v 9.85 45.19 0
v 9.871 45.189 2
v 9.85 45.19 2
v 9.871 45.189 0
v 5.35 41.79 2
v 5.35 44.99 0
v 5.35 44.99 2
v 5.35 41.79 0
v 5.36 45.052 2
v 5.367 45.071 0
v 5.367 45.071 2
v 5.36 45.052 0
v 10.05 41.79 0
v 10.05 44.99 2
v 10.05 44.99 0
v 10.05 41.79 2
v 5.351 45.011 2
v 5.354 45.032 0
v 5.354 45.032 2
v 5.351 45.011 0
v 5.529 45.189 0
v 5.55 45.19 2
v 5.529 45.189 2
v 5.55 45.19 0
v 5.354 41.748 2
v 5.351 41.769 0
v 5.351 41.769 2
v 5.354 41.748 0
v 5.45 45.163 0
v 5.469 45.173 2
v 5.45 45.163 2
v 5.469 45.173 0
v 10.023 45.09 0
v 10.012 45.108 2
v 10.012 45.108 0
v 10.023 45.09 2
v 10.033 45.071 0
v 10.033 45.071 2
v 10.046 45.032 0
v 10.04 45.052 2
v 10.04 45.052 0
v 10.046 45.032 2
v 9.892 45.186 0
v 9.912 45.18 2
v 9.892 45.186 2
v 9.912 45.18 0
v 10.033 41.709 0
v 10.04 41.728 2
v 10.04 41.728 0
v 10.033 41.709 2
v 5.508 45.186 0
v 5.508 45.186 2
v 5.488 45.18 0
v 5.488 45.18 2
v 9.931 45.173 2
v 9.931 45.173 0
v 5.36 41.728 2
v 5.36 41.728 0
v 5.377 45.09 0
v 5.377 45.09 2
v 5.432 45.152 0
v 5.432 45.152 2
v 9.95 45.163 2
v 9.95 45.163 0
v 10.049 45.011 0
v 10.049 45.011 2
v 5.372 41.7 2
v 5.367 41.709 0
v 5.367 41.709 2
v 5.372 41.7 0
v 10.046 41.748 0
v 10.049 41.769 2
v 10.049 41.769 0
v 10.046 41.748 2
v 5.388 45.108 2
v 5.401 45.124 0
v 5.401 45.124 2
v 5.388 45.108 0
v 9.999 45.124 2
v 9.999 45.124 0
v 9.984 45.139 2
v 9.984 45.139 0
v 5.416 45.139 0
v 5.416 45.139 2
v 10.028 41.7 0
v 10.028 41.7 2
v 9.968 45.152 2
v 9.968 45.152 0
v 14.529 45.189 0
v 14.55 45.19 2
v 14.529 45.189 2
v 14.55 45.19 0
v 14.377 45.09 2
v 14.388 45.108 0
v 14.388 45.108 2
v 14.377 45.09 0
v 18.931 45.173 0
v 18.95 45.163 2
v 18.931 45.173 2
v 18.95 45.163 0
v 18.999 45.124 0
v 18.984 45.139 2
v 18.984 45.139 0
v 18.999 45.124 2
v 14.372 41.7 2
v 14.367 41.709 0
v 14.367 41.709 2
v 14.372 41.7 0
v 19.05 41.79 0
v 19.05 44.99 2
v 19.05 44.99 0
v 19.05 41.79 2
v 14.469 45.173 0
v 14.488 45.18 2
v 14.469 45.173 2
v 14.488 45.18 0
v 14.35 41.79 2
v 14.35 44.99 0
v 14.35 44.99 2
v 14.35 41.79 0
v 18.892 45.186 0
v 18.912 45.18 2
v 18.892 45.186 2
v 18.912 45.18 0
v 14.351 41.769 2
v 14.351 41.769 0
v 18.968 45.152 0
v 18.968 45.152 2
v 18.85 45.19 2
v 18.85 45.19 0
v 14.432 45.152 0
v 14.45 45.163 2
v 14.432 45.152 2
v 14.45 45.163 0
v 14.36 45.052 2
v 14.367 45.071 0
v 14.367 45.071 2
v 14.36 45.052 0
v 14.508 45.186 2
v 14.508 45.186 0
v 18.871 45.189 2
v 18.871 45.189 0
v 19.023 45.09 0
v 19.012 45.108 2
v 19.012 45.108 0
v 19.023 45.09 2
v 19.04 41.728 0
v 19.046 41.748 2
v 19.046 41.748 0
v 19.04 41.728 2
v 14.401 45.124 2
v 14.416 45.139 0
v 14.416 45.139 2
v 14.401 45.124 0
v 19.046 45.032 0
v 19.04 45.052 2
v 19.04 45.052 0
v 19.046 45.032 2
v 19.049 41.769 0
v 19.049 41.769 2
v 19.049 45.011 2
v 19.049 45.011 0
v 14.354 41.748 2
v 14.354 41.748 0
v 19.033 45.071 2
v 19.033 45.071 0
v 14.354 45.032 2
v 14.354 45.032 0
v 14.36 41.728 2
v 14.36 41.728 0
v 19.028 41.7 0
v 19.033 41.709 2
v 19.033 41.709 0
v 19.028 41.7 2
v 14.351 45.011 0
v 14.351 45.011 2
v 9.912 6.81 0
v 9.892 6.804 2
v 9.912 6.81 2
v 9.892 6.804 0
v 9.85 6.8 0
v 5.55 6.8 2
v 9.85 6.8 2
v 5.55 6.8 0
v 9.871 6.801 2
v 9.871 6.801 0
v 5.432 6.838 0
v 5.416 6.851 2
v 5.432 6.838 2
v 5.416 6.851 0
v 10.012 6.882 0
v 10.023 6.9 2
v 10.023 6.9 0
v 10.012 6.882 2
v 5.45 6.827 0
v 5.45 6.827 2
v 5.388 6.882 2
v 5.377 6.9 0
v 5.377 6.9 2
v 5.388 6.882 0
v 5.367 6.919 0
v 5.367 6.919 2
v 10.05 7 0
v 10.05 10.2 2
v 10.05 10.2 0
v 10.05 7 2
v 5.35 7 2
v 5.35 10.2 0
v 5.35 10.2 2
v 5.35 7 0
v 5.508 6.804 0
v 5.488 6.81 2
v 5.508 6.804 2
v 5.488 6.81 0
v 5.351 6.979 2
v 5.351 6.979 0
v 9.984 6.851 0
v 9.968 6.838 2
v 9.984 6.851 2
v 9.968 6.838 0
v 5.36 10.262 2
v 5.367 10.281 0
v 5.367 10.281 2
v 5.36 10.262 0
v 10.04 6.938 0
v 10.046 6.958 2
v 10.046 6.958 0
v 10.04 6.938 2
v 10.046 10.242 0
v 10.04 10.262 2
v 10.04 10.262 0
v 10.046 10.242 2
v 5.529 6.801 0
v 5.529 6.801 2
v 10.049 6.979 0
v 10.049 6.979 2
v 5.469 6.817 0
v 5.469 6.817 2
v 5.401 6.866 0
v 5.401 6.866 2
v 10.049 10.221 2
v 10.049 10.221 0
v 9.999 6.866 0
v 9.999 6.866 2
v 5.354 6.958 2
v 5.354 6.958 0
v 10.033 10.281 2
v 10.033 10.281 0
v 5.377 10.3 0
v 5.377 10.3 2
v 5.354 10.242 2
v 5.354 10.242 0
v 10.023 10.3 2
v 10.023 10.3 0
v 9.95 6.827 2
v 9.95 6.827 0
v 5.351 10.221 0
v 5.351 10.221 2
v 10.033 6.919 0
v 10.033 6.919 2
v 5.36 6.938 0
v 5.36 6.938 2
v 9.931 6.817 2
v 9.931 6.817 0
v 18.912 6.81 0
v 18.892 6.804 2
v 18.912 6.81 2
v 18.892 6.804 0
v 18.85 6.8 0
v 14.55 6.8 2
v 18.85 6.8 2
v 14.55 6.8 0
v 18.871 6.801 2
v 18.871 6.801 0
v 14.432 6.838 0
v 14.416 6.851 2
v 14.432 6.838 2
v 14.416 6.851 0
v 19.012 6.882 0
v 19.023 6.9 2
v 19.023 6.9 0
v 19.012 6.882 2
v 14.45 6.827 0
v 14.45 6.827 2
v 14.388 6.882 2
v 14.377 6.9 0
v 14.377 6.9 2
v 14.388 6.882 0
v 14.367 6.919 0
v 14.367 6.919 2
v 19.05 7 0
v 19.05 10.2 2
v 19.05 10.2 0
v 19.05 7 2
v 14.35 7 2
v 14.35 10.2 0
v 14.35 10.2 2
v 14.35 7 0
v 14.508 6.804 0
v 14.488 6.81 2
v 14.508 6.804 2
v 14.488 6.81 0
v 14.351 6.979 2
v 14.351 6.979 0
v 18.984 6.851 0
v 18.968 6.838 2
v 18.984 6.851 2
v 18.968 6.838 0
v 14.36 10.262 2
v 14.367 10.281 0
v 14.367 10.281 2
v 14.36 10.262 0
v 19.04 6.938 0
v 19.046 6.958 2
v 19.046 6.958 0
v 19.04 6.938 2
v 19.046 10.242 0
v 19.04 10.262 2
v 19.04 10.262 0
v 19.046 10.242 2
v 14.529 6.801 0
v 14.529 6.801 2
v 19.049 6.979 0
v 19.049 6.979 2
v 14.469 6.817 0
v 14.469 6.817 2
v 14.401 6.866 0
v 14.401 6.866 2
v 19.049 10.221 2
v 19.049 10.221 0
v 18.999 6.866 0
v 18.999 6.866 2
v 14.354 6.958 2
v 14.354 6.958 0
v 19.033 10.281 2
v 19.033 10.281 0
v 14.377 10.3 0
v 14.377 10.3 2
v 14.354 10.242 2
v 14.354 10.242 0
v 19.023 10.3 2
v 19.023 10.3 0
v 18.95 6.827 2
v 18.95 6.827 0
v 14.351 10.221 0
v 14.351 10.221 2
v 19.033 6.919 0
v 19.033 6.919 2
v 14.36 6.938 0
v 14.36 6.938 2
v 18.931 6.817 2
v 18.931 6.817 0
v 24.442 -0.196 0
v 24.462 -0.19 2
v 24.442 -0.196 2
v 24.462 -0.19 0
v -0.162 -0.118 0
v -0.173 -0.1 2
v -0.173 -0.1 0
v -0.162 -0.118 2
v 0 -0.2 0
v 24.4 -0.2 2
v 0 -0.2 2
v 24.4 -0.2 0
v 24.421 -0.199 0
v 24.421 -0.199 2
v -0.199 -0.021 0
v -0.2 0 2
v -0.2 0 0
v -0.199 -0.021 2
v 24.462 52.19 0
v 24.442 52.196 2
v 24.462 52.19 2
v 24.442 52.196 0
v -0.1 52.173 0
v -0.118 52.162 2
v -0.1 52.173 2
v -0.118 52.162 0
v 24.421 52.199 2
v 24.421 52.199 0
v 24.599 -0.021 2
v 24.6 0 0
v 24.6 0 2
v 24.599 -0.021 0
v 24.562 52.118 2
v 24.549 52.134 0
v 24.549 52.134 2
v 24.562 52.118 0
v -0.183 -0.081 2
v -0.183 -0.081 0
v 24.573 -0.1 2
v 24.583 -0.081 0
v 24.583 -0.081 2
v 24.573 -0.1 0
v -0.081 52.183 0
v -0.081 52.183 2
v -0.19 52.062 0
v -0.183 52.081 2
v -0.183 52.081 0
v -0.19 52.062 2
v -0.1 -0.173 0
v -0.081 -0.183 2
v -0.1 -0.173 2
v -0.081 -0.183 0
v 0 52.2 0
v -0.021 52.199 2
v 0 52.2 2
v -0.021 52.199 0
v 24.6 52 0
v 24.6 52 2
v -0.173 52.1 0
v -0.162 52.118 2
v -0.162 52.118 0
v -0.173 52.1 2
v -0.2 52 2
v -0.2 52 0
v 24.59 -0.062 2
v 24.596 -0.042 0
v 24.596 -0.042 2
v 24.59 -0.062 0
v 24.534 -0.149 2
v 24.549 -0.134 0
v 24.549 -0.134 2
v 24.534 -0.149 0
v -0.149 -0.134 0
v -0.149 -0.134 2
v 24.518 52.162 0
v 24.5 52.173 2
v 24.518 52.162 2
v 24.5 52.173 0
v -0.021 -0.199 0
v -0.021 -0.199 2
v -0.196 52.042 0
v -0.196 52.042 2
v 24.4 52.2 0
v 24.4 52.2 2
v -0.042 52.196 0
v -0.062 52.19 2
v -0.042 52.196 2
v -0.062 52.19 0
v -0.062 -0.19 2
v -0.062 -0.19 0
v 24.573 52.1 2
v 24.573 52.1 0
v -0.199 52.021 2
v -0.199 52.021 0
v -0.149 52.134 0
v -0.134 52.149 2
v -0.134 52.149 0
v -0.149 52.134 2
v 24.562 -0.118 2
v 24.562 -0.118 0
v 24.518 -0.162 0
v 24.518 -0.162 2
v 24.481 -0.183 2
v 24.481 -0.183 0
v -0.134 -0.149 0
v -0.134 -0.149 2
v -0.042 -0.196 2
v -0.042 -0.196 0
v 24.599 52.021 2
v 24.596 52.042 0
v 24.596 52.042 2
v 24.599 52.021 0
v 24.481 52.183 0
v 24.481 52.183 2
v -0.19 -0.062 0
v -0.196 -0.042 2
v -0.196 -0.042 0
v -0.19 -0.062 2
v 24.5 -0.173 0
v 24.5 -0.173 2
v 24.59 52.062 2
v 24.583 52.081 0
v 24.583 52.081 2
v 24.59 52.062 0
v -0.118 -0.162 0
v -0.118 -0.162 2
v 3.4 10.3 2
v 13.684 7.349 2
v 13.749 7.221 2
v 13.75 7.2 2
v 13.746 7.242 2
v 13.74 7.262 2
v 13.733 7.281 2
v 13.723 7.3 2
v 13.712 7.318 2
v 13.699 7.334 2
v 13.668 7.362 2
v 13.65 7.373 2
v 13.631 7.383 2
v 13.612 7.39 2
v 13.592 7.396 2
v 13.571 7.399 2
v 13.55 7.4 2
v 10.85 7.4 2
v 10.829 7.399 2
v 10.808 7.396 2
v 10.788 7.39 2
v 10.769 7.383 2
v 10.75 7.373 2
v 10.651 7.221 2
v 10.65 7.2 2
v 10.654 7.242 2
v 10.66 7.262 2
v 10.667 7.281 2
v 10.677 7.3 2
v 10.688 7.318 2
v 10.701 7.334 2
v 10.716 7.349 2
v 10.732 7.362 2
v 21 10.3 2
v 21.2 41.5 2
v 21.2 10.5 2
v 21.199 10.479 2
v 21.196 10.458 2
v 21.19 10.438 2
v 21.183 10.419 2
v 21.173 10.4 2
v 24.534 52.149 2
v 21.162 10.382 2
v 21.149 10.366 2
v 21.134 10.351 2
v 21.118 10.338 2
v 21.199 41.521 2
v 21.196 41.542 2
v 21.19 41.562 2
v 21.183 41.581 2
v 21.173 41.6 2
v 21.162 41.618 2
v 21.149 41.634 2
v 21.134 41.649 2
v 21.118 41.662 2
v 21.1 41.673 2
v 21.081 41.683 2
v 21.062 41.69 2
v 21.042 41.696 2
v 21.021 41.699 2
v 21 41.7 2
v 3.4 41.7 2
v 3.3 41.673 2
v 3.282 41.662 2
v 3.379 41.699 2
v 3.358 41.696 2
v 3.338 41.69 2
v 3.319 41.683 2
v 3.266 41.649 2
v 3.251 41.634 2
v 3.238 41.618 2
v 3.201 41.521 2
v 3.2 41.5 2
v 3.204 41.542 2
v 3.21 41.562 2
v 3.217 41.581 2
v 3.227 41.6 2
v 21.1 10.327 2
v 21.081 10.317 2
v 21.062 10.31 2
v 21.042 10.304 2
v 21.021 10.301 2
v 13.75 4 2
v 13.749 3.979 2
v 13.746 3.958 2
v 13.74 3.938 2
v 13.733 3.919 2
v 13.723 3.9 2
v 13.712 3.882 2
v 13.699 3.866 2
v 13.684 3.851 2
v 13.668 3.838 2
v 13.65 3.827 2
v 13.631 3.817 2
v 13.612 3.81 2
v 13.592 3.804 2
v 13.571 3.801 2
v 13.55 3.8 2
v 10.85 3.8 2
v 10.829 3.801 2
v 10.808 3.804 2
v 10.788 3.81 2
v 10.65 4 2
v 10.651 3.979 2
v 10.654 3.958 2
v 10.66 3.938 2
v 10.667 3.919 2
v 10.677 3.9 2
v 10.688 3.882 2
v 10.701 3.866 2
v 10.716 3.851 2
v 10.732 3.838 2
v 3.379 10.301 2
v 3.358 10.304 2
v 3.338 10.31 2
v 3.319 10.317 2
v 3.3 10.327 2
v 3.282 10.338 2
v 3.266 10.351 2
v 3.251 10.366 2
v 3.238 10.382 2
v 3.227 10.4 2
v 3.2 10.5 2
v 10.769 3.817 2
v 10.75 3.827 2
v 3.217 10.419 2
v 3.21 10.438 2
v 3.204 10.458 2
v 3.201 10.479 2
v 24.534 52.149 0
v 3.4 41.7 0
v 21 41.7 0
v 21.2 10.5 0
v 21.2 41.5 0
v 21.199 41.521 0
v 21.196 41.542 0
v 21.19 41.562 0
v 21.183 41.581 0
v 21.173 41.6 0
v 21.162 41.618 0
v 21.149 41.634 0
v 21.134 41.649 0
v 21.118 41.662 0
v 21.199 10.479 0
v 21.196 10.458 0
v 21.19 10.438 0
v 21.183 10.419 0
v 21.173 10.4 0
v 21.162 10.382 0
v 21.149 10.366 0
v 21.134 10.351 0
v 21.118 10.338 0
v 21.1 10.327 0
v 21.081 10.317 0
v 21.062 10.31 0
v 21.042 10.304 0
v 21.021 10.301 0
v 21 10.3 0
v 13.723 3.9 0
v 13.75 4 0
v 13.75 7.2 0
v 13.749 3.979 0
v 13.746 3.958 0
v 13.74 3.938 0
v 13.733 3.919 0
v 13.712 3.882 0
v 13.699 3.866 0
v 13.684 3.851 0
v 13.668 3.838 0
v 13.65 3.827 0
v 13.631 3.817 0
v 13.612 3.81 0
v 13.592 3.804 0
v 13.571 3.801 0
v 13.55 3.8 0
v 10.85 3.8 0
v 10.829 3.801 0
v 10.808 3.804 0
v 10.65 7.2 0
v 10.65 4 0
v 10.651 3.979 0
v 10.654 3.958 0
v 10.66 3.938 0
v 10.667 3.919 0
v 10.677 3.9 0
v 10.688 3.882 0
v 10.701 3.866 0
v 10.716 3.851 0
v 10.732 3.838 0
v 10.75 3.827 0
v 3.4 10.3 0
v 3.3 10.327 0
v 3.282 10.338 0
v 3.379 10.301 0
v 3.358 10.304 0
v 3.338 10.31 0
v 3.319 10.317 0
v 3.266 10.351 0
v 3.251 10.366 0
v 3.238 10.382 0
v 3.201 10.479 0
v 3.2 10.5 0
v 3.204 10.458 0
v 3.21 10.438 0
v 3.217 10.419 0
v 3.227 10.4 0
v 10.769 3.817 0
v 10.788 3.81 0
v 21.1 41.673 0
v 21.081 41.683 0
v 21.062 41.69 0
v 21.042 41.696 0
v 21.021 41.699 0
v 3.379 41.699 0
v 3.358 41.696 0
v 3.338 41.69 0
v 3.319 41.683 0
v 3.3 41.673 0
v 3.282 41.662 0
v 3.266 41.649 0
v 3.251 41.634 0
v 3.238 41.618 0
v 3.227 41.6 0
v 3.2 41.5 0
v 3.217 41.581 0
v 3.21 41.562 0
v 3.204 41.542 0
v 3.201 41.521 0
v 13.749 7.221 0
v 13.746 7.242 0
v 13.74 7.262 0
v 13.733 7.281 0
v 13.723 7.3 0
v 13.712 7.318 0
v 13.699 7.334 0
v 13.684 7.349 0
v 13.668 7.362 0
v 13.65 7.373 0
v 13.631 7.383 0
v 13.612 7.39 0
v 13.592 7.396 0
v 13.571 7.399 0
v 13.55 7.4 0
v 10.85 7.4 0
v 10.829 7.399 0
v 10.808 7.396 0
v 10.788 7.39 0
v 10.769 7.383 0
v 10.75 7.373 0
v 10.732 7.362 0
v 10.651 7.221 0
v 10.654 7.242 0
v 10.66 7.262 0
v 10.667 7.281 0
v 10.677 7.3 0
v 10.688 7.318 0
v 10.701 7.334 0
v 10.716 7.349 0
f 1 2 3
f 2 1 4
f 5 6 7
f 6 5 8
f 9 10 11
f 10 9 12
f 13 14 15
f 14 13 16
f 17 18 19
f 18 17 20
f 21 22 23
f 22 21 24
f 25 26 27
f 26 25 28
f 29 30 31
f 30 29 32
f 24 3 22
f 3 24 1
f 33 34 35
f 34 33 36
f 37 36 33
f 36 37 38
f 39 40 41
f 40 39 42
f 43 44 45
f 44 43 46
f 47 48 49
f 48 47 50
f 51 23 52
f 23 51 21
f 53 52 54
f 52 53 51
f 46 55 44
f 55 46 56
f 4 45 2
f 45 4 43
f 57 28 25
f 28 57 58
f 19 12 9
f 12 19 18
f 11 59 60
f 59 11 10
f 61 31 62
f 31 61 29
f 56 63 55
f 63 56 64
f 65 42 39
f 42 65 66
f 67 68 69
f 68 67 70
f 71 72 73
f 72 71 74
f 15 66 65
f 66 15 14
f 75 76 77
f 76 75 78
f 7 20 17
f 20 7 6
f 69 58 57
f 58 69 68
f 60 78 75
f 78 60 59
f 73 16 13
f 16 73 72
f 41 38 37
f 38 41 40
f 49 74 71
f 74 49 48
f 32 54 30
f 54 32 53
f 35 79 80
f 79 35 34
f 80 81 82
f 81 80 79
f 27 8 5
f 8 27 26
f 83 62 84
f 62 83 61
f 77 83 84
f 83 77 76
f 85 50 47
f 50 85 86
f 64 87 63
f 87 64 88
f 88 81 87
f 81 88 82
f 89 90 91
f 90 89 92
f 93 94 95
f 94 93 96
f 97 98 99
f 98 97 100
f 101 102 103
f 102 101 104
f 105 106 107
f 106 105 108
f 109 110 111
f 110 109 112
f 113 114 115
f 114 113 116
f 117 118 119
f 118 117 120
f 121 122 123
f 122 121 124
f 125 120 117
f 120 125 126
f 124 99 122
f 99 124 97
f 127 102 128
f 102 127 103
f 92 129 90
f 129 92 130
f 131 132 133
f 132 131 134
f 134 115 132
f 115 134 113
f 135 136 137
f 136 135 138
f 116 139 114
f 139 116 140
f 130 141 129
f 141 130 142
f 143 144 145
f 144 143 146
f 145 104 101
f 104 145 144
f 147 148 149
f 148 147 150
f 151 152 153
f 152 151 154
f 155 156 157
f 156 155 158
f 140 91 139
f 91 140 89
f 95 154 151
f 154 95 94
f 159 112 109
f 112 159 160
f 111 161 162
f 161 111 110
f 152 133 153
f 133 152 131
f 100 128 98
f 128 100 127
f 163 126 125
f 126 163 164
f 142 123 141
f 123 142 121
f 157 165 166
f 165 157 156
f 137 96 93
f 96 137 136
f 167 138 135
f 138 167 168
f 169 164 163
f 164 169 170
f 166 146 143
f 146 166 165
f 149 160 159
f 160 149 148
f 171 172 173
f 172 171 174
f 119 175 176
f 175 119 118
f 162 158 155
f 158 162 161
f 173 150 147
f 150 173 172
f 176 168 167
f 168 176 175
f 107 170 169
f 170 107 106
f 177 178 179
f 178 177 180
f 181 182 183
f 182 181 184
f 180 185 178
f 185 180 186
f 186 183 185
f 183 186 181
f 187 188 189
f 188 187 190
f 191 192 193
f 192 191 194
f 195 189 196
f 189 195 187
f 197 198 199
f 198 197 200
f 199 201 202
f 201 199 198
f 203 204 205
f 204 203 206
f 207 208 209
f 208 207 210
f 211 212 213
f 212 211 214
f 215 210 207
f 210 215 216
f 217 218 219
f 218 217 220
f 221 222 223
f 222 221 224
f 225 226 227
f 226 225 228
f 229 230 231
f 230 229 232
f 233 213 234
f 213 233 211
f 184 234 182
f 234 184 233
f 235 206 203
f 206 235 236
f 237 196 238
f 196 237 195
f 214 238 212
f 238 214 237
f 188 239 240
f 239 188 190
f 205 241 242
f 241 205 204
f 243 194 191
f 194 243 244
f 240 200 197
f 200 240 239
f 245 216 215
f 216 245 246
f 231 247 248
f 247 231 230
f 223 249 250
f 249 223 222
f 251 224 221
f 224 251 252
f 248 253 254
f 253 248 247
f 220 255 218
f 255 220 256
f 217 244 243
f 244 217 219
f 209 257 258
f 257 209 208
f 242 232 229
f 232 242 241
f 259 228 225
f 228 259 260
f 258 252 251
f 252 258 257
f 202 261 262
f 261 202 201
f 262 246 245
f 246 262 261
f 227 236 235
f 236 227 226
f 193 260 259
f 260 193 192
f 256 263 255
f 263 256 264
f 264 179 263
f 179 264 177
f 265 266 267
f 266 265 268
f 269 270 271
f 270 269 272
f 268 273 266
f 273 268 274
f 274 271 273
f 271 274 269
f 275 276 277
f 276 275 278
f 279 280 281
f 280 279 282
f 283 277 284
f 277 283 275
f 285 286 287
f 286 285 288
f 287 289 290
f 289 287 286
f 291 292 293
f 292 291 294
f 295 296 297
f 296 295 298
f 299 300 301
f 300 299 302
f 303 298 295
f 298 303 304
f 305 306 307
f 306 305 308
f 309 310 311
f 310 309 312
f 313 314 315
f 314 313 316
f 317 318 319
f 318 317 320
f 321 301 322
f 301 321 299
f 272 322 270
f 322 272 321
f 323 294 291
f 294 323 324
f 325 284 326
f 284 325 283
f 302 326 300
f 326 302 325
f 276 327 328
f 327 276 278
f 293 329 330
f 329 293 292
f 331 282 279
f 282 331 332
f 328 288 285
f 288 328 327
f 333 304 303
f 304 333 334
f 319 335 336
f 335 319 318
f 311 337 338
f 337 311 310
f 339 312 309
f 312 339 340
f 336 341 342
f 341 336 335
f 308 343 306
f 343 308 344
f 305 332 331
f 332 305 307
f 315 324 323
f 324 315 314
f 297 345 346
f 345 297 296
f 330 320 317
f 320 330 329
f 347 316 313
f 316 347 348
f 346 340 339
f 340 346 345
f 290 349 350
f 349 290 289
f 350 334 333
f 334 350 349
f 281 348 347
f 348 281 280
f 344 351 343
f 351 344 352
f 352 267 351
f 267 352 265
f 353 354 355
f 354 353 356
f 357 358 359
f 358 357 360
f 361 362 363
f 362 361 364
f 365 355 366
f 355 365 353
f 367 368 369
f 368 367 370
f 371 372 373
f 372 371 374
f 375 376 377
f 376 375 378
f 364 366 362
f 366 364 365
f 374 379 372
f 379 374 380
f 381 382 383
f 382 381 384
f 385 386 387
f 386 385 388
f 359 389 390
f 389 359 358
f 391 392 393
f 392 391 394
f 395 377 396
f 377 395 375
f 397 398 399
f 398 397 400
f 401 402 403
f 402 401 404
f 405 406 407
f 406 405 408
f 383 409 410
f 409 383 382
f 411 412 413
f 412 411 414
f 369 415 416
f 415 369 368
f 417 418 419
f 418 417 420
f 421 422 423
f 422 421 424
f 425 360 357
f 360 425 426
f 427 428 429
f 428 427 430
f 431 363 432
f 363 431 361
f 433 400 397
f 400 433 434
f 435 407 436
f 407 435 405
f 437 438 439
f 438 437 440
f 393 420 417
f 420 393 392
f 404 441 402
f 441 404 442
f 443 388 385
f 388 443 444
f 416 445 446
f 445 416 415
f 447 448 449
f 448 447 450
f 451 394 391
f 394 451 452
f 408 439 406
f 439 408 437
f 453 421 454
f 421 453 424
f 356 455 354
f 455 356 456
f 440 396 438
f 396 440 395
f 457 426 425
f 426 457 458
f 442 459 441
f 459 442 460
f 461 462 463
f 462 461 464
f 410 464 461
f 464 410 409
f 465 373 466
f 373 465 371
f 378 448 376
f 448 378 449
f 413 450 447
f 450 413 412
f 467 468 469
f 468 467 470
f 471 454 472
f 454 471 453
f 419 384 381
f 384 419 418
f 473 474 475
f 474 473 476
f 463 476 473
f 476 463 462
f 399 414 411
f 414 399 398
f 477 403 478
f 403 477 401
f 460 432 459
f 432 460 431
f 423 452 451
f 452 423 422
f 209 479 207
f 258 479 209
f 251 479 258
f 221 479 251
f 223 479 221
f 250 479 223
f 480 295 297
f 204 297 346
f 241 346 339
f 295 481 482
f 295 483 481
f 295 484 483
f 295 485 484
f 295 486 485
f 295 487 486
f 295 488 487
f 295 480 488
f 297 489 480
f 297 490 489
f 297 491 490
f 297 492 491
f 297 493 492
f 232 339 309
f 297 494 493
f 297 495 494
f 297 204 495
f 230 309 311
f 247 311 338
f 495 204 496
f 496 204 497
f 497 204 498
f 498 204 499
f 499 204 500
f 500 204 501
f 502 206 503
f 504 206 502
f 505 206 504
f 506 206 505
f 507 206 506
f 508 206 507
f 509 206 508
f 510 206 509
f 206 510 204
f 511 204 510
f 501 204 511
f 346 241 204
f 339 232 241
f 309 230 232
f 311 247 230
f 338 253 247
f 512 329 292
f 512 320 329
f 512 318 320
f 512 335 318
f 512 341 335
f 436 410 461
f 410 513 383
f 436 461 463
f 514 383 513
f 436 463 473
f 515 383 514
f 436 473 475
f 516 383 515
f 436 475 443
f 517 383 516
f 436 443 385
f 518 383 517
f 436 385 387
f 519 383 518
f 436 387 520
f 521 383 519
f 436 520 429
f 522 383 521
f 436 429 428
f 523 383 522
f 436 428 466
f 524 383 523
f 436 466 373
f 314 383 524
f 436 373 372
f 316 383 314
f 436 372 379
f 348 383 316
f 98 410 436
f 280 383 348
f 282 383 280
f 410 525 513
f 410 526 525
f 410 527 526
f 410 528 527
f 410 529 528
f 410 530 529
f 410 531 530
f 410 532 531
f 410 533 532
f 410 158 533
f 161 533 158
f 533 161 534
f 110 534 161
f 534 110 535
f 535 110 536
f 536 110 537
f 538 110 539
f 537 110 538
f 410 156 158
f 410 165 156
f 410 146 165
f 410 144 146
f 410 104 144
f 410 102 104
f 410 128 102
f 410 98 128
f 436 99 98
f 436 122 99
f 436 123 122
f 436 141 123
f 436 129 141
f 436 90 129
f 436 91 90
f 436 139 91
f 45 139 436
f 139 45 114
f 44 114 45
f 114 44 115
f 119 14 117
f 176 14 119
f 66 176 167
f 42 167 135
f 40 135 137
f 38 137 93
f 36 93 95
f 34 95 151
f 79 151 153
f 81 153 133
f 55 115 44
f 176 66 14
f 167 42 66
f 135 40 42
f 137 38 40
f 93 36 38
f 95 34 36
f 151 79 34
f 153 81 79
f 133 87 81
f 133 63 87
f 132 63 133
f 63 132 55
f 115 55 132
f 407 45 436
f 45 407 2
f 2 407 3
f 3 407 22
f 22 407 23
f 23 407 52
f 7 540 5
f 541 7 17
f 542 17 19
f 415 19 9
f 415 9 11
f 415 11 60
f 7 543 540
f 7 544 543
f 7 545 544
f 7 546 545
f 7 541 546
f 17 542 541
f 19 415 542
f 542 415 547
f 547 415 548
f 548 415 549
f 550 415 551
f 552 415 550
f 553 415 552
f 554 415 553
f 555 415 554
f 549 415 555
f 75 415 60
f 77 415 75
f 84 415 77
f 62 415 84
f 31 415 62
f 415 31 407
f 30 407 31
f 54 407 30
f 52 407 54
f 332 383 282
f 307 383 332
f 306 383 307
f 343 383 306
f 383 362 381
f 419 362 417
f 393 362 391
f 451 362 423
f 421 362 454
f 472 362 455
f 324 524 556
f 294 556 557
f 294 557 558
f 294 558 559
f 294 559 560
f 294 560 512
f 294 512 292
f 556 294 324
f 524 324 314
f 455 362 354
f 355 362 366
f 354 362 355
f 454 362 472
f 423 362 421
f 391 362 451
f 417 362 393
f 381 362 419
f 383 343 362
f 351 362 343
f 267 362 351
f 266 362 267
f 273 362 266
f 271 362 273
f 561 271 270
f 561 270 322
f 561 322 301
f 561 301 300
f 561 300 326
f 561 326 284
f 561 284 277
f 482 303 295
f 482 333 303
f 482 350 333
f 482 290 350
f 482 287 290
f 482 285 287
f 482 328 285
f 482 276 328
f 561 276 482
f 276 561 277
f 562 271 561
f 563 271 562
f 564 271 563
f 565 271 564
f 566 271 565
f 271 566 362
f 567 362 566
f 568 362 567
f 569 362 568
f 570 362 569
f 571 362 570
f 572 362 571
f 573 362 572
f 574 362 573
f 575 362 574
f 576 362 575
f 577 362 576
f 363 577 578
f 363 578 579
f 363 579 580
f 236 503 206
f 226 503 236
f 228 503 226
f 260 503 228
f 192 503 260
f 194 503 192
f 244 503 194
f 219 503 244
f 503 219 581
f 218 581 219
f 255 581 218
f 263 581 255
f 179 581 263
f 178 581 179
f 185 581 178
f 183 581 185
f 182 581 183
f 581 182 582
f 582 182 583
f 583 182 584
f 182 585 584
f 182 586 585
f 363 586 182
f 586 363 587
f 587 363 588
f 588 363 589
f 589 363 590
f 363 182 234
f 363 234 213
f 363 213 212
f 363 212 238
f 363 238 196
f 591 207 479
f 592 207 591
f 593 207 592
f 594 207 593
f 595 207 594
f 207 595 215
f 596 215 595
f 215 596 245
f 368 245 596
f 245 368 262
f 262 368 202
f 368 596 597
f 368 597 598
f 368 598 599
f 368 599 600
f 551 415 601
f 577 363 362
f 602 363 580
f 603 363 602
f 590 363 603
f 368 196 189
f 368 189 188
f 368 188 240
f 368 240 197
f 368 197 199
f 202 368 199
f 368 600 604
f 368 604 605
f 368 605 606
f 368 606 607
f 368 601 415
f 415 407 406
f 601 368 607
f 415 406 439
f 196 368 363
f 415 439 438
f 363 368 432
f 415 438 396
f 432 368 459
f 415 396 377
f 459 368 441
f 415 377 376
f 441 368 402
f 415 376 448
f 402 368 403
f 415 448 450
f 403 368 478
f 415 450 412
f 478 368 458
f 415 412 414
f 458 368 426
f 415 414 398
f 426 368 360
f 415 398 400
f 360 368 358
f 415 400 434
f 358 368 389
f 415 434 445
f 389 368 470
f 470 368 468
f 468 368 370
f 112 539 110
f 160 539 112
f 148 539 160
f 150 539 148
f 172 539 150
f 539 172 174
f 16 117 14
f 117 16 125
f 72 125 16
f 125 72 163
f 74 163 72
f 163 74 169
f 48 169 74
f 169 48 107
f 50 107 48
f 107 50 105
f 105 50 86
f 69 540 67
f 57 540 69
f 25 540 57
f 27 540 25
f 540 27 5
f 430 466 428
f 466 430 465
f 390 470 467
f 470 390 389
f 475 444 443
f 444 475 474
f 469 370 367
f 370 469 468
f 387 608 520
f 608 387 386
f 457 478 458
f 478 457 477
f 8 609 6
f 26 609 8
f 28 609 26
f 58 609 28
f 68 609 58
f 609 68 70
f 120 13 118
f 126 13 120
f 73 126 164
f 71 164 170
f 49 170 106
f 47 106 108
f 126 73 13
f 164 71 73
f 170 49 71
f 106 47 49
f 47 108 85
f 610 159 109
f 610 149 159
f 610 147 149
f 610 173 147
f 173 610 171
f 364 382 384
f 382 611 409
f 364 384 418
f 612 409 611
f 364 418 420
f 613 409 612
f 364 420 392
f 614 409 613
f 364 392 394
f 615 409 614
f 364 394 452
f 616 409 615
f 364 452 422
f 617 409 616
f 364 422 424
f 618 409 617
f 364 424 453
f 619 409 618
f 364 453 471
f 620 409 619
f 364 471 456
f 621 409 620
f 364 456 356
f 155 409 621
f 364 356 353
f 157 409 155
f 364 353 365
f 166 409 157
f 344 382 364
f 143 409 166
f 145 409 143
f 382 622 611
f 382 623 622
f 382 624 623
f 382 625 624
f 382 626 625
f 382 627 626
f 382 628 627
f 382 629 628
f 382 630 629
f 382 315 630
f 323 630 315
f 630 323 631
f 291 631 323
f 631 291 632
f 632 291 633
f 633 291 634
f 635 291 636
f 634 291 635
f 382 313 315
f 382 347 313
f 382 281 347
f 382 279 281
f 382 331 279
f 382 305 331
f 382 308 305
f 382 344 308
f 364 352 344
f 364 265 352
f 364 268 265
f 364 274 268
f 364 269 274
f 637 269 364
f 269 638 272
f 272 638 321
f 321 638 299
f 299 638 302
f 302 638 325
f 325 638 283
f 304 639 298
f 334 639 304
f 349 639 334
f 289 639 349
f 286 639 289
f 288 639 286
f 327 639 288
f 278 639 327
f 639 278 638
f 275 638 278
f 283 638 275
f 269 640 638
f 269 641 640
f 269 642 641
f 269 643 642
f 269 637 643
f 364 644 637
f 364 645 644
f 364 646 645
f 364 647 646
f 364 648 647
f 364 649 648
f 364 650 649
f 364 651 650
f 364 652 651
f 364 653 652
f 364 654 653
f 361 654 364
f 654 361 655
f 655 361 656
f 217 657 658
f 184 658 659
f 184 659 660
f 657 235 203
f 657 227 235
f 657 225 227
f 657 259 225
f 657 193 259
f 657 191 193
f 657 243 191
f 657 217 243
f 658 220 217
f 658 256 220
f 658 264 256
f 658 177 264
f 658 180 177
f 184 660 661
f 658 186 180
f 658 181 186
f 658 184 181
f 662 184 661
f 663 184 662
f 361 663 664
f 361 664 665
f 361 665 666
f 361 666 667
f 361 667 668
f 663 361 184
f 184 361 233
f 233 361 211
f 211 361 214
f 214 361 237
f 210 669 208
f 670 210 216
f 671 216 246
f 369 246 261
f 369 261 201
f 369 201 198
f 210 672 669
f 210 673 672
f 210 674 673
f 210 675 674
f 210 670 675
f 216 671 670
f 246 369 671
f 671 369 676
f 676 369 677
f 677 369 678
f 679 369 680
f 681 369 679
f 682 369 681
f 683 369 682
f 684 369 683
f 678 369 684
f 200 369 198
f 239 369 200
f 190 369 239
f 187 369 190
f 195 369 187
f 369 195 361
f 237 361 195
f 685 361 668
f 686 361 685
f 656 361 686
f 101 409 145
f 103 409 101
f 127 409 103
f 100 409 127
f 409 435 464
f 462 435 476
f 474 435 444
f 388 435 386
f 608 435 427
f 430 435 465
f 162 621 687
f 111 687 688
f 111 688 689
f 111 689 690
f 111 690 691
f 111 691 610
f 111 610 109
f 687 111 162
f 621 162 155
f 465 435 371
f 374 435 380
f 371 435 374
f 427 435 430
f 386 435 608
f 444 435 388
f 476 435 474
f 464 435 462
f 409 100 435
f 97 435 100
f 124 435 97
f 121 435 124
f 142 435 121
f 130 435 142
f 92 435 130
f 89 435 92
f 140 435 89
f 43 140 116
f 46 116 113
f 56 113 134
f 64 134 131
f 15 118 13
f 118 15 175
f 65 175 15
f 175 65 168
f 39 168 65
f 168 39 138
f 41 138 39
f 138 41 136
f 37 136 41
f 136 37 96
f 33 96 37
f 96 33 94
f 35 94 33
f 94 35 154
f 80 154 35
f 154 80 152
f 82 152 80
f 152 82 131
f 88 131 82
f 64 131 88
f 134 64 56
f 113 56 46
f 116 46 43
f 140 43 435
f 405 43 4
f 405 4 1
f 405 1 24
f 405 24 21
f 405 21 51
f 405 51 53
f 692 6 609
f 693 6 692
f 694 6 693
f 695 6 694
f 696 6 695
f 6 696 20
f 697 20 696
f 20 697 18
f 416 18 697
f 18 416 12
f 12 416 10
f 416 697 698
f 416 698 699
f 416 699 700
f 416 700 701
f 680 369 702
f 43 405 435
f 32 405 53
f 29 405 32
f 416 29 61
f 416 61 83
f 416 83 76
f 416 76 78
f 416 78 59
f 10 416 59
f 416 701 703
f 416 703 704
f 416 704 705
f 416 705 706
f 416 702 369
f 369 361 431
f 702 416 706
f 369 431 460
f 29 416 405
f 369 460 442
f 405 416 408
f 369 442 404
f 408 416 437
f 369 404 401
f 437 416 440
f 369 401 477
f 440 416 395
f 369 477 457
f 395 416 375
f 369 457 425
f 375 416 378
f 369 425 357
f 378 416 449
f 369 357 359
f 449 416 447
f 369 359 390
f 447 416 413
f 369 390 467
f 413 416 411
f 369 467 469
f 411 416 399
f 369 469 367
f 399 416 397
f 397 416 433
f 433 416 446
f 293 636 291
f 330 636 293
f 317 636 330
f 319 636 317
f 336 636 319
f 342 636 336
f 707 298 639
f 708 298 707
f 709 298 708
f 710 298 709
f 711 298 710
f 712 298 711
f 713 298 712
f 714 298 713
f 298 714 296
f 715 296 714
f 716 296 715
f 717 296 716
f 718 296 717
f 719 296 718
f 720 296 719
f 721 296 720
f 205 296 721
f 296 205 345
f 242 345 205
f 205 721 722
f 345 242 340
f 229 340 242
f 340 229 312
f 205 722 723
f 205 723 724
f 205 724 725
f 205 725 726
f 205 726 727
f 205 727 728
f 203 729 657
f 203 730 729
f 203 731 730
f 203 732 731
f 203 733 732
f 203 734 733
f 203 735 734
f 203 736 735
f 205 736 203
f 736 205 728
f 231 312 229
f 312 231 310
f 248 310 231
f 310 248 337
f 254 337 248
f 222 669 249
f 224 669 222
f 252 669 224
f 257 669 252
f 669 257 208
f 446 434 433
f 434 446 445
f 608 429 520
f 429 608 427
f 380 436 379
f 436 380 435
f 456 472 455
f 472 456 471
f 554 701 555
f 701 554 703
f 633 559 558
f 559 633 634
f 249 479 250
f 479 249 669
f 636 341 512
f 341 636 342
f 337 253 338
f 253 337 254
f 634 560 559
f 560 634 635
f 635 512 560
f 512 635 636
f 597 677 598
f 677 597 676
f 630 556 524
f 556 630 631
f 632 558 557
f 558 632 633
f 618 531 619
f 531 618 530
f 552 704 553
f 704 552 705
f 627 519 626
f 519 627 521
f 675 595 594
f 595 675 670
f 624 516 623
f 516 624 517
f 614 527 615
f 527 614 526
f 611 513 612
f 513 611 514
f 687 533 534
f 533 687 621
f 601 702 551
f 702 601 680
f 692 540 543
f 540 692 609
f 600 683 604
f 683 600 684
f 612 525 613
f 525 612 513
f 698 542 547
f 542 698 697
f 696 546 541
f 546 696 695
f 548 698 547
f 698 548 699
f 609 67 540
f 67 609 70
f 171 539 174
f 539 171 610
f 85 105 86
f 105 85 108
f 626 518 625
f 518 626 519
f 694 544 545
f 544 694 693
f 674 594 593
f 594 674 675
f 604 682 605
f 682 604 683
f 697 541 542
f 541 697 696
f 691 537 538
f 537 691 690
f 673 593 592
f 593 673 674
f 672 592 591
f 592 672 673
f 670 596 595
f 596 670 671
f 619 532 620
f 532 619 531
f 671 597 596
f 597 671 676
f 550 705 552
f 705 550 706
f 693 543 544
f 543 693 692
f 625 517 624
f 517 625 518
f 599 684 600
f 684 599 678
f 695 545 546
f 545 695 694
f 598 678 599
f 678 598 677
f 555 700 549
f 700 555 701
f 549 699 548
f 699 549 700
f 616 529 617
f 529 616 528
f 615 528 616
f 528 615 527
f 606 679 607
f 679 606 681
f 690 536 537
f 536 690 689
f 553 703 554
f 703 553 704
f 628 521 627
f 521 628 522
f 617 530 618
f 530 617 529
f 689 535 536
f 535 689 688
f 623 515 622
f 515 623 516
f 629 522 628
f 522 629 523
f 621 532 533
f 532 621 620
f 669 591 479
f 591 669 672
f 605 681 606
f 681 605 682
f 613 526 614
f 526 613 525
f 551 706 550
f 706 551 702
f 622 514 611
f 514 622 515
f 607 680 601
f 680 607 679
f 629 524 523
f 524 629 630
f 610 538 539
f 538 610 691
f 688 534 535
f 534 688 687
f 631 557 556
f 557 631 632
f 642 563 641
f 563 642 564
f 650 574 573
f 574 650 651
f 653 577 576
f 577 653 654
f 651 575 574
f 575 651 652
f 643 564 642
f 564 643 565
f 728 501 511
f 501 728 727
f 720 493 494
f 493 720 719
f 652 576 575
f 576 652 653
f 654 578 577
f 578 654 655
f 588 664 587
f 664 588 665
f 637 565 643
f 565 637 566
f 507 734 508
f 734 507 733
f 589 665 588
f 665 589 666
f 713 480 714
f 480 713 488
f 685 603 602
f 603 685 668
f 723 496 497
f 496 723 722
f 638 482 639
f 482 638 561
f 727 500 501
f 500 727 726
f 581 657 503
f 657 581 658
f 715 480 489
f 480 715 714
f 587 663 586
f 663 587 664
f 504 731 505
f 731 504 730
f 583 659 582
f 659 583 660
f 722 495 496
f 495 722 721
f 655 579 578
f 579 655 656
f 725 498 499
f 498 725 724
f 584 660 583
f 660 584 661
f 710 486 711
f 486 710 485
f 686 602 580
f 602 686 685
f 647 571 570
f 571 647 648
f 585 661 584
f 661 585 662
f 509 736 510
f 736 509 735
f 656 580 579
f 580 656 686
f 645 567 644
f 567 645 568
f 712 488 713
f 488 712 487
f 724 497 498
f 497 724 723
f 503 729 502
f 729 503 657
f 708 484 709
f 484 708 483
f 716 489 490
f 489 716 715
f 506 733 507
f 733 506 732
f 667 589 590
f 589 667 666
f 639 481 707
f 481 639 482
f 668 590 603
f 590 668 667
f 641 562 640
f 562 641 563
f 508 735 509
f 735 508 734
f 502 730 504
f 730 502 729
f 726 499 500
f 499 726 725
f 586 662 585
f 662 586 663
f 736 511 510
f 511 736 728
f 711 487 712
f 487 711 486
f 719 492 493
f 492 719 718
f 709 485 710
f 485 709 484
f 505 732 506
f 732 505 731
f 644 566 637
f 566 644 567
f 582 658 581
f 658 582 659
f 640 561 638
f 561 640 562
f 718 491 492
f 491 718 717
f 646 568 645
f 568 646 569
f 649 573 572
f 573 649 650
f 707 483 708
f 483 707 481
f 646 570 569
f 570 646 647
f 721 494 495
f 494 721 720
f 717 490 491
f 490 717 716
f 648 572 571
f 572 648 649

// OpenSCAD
// Pimoroni Pico Display Pack Facade
// All dimensions in mm

// Global parameters
$fn = 60;
plate_thickness = 2.0;
extra_clearance = 0.2; // Tolerance for cutouts

// Board Dimensions
board_width = 24.4; // Based on drawing (approx 24.4mm + margin)
board_height = 52.0; // Based on drawing (52mm total height)

// Screen Cutout (centered horizontally and vertically)
screen_width = 31.0;
screen_height = 17.6;

// Button dimensions
button_width = 3.2;
button_height = 4.3;

// Button positions (relative to bottom-left corner)
// Calculated from drawing center lines
buttons = [
  [7.70, 43.39], // Button B (Top Left)
  [16.70, 43.39], // Button A (Top Right)
  [7.70, 8.60], // Button Y (Bottom Left)
  [16.70, 8.60], // Button X (Bottom Right)
];

// LED width, height
led_dim = [2.7, 3.2];
// LED position (centered, relative to bottom left corner)
led_pos = [4.0, board_height / 2];

module pico_display_facade() {
  difference() {
    // Main Plate
    linear_extrude(height=plate_thickness)
      offset(r=extra_clearance)
        square([board_width, board_height]);

    // Screen Cutout
    translate([(board_width - screen_height) / 2, (board_height - screen_width) / 2, -1])
      linear_extrude(height=plate_thickness + 2)
        offset(r=extra_clearance)
          square([screen_height, screen_width]);

    // Button cutouts
    for (pos = buttons) {
      translate([pos[0], pos[1], -1])
        linear_extrude(height=plate_thickness + 2)
          offset(r=extra_clearance)
            square(size=[button_height, button_width], center=true);
    }

    // LED Cutout
    translate([(board_width-led_dim[0])/2, 4, -1])
      linear_extrude(height=plate_thickness + 10)
        offset(r=extra_clearance)
          square(led_dim);
  }
}

pico_display_facade();
